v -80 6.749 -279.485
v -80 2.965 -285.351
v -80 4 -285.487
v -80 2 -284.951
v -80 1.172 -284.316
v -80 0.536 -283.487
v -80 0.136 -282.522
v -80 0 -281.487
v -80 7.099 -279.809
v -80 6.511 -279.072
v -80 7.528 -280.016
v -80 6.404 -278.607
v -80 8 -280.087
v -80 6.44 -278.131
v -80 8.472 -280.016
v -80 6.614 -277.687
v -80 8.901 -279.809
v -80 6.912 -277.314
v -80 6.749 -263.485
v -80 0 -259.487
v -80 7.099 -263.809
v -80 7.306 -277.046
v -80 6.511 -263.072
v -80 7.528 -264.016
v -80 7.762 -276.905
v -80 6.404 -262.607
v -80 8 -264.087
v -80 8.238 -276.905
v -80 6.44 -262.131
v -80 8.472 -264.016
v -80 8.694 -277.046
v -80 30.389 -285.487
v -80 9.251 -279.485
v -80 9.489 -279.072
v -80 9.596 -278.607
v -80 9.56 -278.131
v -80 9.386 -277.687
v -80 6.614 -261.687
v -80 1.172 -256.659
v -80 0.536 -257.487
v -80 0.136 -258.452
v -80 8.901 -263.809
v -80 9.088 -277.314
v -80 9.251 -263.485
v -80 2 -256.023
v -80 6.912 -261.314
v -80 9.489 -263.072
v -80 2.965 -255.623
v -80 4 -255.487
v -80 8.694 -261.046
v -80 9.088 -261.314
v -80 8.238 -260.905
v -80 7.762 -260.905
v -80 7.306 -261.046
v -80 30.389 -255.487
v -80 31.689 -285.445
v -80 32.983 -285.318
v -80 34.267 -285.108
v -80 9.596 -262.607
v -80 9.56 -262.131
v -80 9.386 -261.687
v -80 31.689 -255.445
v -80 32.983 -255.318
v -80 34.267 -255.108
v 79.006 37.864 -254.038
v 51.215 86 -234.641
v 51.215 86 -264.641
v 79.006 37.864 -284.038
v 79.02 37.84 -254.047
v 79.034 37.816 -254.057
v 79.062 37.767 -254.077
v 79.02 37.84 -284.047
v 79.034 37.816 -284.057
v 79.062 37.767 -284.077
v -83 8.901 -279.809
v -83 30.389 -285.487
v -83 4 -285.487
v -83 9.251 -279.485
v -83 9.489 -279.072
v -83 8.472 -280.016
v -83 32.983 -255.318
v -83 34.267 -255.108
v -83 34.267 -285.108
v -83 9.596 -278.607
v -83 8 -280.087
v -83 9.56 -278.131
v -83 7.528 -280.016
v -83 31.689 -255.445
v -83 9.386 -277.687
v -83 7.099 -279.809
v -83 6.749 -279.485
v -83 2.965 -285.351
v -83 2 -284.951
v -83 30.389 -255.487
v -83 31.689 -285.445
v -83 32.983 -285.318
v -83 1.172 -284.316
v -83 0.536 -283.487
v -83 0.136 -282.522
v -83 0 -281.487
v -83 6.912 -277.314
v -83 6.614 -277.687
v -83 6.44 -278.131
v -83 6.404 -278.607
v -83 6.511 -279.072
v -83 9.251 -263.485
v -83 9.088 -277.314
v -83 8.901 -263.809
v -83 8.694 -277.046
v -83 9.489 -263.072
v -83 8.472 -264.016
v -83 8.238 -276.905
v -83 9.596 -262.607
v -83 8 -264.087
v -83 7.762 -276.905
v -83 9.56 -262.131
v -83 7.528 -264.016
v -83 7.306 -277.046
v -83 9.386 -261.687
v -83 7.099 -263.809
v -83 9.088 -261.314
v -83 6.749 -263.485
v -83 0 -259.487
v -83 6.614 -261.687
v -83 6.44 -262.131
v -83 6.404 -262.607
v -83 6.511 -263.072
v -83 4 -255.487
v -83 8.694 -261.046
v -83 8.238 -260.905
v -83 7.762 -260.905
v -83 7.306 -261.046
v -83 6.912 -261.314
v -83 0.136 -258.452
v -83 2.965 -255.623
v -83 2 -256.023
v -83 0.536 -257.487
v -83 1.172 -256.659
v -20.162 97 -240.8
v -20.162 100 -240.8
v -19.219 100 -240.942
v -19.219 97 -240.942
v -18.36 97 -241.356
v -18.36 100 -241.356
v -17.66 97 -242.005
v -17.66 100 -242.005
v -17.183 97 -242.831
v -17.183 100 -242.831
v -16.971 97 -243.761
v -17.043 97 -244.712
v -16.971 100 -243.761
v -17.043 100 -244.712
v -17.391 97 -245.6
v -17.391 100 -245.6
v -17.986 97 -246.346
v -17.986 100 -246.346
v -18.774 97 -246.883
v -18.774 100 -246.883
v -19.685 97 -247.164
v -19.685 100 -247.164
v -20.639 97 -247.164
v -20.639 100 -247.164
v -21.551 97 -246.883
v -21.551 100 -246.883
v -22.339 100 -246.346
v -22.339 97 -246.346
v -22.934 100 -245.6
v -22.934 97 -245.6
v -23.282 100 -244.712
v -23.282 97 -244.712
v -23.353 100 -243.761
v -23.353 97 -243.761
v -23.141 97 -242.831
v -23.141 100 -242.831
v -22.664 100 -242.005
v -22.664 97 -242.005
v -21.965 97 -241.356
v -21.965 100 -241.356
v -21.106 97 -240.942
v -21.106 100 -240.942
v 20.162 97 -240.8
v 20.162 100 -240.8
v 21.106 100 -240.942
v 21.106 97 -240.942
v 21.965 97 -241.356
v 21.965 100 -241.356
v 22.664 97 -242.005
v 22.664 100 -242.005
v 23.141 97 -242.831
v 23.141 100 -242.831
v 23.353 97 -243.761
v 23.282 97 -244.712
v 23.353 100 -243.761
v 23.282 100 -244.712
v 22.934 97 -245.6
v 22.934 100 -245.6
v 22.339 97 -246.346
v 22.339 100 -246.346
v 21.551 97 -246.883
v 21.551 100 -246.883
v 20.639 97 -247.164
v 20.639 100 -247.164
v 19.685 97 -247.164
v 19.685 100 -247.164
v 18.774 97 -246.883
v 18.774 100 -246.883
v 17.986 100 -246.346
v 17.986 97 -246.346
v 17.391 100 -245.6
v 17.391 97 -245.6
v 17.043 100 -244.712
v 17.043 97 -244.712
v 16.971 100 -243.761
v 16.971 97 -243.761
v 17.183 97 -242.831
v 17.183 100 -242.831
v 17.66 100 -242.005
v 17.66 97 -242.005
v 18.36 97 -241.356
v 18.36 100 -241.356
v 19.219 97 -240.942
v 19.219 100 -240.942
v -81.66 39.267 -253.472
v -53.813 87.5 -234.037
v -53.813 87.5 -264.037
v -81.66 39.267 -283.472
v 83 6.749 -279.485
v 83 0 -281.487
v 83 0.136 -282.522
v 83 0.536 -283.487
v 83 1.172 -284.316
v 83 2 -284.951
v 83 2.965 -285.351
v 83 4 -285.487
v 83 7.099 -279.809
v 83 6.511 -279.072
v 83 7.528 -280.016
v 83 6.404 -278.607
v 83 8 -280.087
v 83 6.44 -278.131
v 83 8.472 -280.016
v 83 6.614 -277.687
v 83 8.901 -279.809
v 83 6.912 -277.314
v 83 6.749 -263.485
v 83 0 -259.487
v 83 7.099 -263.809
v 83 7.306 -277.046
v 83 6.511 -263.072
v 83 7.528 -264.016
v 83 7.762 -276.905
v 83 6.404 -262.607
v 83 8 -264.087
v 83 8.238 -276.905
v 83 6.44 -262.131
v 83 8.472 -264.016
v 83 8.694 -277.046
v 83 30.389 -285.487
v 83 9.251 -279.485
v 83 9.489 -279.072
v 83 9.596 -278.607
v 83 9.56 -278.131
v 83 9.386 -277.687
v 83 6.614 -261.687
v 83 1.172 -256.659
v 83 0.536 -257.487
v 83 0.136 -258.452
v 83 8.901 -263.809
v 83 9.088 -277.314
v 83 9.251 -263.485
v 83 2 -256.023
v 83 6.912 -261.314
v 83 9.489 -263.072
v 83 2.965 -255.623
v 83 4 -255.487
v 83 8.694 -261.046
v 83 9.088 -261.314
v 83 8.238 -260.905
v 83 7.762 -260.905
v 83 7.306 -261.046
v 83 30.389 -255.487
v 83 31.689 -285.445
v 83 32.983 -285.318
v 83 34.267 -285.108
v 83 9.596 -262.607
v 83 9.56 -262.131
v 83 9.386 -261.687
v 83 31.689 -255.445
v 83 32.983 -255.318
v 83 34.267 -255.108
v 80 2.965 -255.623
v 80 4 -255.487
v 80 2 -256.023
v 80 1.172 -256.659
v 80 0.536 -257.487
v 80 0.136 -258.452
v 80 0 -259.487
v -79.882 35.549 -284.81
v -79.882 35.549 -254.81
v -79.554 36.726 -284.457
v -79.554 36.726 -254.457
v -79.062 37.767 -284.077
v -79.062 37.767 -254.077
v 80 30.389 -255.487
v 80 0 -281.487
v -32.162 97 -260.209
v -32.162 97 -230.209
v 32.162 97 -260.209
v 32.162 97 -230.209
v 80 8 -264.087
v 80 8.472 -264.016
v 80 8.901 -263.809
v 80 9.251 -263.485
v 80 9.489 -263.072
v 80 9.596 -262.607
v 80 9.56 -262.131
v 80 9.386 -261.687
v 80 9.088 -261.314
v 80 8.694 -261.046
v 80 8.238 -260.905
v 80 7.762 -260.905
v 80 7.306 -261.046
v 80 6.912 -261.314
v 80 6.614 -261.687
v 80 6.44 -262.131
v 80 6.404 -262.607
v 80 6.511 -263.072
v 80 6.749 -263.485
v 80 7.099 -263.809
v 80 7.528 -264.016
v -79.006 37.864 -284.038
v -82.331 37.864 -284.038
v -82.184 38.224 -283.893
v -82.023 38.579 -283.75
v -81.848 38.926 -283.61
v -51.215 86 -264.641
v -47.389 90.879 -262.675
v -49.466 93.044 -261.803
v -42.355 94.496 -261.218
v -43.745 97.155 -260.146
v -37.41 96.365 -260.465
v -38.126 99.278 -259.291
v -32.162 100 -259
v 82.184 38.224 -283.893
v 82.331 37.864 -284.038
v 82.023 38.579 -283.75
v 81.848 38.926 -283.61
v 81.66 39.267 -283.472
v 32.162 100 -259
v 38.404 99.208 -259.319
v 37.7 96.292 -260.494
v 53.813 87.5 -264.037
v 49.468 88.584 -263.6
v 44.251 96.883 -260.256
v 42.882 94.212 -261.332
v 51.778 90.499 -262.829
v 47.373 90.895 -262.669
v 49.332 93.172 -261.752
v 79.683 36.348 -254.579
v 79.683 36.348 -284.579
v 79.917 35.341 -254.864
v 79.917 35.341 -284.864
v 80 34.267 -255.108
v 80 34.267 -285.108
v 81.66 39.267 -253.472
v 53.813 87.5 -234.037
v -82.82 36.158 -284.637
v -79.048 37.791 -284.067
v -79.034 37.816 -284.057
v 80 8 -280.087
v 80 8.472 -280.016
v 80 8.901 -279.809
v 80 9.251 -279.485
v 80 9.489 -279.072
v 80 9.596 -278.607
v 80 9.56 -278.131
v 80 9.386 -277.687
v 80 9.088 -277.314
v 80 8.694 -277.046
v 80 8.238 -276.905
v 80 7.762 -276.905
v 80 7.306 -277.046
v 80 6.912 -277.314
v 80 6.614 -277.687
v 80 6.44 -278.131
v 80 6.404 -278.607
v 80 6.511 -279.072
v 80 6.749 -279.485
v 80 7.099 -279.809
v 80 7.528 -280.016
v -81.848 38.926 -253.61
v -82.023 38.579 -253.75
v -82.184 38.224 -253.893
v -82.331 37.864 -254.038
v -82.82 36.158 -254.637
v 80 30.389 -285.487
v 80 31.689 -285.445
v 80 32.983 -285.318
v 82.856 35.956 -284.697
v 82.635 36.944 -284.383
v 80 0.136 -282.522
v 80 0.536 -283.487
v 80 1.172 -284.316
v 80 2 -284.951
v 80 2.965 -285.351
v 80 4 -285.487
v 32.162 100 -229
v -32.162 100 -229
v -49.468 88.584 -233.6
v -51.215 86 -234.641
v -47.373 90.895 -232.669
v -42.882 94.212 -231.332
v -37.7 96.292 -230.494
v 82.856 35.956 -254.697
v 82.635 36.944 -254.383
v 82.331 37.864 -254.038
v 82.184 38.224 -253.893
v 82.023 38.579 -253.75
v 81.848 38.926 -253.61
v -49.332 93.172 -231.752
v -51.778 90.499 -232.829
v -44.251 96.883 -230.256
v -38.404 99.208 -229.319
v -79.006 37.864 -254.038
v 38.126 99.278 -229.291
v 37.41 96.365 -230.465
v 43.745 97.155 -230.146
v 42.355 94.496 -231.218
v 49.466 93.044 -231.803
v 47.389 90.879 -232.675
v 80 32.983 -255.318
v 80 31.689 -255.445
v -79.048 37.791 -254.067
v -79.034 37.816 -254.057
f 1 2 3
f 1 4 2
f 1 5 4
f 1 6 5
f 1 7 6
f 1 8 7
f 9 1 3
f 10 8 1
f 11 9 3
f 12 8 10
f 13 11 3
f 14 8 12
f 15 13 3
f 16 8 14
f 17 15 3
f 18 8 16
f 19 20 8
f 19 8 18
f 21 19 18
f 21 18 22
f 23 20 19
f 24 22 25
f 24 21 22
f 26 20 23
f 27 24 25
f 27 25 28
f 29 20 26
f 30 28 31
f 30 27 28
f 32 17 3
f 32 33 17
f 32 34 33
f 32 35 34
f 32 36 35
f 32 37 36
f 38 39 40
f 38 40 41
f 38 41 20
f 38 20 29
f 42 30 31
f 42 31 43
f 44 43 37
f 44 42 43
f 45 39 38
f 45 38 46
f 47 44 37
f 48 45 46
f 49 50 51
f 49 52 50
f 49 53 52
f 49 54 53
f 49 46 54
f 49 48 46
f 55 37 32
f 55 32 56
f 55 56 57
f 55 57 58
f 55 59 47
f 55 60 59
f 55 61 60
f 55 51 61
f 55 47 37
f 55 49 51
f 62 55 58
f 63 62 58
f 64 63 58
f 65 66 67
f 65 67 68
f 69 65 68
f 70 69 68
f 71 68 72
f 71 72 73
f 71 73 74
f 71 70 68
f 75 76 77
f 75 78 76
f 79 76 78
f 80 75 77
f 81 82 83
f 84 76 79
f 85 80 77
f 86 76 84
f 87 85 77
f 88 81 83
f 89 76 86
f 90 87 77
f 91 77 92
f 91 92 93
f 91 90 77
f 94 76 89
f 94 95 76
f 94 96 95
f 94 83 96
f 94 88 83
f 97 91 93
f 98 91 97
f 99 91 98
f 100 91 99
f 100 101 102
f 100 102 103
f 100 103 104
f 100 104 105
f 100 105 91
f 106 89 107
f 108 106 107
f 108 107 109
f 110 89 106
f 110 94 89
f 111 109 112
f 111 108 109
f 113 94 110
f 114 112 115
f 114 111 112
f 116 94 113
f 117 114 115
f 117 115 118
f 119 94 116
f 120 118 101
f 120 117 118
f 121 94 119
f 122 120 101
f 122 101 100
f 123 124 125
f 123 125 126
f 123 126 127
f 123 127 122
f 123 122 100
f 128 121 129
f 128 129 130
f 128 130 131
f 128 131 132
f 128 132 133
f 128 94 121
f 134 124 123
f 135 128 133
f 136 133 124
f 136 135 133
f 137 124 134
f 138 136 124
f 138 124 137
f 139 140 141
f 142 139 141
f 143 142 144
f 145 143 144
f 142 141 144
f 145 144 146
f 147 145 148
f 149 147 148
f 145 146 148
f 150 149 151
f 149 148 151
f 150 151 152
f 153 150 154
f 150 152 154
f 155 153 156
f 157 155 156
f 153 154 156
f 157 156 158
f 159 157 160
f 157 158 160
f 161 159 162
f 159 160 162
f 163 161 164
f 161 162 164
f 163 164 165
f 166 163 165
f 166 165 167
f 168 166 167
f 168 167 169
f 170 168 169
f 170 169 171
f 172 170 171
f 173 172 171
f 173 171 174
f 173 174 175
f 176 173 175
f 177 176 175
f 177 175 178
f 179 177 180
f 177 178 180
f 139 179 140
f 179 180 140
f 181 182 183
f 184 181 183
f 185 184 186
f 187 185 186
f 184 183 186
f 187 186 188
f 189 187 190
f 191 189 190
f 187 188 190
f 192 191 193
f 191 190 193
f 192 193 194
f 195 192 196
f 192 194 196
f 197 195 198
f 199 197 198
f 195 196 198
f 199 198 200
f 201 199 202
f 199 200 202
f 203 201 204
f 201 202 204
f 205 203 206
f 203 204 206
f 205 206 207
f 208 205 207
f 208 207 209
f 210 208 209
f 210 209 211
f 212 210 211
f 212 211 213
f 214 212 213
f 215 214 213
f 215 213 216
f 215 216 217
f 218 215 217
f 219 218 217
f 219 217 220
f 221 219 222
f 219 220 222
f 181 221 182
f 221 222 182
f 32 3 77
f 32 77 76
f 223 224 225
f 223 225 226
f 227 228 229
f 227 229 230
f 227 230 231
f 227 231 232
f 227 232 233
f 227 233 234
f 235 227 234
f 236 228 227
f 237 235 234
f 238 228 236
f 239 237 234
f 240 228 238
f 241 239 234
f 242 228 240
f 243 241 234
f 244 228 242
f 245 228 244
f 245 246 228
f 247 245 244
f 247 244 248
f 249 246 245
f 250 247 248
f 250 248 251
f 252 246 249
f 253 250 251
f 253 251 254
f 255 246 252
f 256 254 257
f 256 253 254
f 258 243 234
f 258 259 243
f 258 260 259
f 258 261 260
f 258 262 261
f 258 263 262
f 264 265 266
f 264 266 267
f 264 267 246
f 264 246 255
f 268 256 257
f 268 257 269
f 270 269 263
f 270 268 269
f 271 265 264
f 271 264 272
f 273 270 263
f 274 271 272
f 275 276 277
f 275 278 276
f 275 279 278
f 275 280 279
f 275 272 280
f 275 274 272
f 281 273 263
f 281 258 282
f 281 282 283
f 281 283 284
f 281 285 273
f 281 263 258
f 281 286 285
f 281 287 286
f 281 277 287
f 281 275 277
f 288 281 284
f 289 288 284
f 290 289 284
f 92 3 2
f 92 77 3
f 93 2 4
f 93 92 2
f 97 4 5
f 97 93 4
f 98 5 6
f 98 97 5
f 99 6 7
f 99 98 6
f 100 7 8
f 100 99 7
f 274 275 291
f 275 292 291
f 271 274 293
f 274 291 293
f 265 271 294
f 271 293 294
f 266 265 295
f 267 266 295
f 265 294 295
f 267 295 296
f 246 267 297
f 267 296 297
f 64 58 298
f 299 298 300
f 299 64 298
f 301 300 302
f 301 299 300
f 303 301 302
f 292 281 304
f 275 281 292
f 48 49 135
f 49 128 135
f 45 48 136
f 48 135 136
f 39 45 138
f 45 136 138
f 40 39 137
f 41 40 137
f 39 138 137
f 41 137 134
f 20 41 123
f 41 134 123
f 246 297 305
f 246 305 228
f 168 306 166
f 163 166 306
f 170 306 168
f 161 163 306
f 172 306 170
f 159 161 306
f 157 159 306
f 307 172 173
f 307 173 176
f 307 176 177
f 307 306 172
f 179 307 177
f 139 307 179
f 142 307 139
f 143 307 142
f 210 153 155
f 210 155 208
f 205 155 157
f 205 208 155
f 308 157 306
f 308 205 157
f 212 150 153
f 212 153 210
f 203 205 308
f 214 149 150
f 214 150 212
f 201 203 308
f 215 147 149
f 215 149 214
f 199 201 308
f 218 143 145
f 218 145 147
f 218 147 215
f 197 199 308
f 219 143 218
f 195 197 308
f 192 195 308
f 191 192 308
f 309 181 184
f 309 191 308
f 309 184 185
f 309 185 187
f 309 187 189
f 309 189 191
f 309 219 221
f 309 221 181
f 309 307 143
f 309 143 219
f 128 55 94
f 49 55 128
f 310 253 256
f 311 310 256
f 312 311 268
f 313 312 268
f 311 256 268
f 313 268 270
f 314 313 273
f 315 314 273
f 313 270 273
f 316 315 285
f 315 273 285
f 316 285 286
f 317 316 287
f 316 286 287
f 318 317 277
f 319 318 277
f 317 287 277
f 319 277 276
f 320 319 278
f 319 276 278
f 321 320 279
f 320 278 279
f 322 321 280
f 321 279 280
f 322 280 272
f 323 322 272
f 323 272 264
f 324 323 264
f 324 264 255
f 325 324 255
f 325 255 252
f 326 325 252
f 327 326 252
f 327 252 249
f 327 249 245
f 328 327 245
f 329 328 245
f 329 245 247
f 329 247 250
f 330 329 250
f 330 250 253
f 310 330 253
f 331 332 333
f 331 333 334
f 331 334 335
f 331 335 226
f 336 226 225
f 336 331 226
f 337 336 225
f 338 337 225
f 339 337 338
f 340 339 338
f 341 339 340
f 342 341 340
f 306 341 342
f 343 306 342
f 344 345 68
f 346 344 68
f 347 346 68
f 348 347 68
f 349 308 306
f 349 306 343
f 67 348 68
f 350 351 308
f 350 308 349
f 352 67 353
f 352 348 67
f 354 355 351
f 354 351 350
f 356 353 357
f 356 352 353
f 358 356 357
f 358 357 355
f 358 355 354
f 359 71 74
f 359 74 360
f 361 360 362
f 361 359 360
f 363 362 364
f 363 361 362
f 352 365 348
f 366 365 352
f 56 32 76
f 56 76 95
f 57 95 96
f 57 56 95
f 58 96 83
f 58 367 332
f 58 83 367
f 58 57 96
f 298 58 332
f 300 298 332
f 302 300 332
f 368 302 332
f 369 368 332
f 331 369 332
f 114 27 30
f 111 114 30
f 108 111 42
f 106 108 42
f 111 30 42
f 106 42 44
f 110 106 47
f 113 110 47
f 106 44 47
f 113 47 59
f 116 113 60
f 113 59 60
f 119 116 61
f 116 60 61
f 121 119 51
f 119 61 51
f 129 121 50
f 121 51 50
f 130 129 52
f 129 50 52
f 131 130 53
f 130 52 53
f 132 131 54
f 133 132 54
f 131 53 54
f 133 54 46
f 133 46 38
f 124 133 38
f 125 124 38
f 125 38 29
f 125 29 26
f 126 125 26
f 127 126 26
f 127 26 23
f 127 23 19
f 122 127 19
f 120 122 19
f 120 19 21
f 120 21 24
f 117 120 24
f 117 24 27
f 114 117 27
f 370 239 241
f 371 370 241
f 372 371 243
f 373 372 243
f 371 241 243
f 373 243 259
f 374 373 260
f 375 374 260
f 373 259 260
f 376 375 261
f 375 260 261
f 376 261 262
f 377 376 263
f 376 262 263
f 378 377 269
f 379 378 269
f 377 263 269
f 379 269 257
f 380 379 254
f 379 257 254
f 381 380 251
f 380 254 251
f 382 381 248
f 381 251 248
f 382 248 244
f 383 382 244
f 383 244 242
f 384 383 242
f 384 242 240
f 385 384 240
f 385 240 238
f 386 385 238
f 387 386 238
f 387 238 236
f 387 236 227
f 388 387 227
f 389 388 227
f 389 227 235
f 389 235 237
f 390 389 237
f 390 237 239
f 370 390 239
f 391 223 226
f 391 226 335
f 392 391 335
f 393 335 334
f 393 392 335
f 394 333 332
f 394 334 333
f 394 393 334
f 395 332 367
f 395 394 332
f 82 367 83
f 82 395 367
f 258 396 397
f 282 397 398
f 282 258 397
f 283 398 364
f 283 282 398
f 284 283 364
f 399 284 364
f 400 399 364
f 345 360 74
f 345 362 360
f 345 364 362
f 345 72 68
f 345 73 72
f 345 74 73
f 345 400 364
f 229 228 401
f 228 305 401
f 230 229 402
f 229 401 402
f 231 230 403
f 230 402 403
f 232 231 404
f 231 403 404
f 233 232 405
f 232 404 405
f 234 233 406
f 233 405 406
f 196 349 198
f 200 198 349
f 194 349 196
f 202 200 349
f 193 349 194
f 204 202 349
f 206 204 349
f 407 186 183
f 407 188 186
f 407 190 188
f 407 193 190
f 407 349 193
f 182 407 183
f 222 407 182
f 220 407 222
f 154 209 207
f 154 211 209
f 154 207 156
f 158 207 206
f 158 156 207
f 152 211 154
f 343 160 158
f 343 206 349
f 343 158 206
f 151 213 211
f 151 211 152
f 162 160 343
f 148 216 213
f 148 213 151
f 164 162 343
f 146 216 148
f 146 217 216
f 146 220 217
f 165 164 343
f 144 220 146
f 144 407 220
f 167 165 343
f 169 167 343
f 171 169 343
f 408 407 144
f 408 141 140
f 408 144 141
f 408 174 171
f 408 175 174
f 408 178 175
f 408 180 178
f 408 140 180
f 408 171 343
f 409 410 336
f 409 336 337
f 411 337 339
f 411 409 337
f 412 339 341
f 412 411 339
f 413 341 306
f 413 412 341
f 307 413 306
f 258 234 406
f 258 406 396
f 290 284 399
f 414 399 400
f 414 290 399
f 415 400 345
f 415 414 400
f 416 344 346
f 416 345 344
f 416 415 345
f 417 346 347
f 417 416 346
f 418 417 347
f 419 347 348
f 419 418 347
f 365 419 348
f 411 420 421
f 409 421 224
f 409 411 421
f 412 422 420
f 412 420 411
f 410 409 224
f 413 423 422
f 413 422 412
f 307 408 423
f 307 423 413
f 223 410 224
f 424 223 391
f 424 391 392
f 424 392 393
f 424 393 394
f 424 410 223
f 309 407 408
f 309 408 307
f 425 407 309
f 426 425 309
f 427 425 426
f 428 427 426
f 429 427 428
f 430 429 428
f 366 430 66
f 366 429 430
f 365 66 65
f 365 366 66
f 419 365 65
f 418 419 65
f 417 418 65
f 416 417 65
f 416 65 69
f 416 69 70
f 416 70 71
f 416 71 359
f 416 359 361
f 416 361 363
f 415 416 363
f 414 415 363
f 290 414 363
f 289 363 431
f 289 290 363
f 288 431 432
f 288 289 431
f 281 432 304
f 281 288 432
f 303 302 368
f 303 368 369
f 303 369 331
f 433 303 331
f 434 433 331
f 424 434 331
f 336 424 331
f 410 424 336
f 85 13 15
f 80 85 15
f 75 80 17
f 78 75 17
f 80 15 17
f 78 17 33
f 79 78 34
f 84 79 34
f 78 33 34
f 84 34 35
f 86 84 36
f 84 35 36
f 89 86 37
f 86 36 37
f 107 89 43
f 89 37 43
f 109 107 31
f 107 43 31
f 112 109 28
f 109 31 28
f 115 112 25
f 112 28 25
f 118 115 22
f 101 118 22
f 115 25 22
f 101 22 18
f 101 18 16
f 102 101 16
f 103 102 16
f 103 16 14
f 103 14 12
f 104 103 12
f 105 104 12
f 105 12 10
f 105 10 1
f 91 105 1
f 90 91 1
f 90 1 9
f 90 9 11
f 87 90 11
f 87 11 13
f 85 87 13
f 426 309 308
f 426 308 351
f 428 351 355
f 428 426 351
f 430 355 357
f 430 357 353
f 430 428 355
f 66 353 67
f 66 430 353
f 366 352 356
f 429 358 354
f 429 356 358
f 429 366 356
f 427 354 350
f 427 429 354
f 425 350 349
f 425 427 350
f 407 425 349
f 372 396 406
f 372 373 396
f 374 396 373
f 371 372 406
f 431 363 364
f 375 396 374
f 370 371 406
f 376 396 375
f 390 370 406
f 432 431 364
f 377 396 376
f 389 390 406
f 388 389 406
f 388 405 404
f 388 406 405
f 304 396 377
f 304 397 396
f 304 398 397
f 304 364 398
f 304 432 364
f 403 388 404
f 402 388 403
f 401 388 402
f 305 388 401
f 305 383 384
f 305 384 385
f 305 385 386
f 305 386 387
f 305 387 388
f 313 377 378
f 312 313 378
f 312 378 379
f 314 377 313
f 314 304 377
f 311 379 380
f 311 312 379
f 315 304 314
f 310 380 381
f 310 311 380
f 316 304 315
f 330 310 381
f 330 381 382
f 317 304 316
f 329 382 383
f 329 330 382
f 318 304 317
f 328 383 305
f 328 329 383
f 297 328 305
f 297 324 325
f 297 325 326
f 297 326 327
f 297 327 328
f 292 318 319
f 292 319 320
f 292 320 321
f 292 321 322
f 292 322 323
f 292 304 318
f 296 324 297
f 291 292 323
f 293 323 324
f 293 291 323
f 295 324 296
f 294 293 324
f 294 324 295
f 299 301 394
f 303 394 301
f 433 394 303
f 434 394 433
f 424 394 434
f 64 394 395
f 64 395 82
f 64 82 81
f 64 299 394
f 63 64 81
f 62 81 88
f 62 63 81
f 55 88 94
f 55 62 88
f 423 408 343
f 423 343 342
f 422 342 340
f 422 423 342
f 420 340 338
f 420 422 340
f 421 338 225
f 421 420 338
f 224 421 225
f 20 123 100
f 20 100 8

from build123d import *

# Parameters (mm, degrees)
BOSS_EXTRUDE4_DEPTH      = 40
BOSS_EXTRUDE4_DEPTH_BACK = 20
SKETCH5_OUTSIDE_W        = 102.574
SKETCH5_OUTSIDE_H        = 142.574
CUT_EXTRUDE1_DEPTH       = 348.961204734
SKETCH6_R                = 1.6
CUT_EXTRUDE2_DEPTH       = 346.049136601
FILLET1_R                = 4
SKETCH7_R                = 3.2
CUT_EXTRUDE3_DEPTH       = 3


with BuildPart() as part:
    # Sketch4 → Boss-Extrude4 (new, two sides: drawn at the far end of the back side and taken through both)
    with BuildSketch(Plane(origin=(0, 0, -249), x_dir=(-1, 0, 0), z_dir=(0, 0, -1)).offset(-BOSS_EXTRUDE4_DEPTH_BACK)):
        with BuildLine():
            Line((-83, 0), (-83, 34.267002189))
            ThreePointArc((-83, 34.267002189), (-82.659258263, 36.85519264), (-81.660254038, 39.267002189))
            Line((-81.660254038, 39.267002189), (-53.812919768, 87.5))
            ThreePointArc((-53.812919768, 87.5), (-44.662284673, 96.650635095), (-32.162284673, 100))
            Line((-32.162284673, 100), (0, 100))
            Line((0, 100), (32.162284673, 100))
            ThreePointArc((32.162284673, 100), (44.662284673, 96.650635095), (53.812919768, 87.5))
            Line((53.812919768, 87.5), (81.660254038, 39.267002189))
            ThreePointArc((81.660254038, 39.267002189), (82.659258263, 36.85519264), (83, 34.267002189))
            Line((83, 34.267002189), (83, 0))
            Line((83, 0), (80, 0))
            Line((80, 0), (80, 34.267002189))
            ThreePointArc((80, 34.267002189), (79.761480784, 36.078735505), (79.062177826, 37.767002189))
            Line((79.062177826, 37.767002189), (51.214843556, 86))
            ThreePointArc((51.214843556, 86), (43.162284673, 94.052558883), (32.162284673, 97))
            Line((32.162284673, 97), (0, 97))
            Line((0, 97), (-32.162284673, 97))
            ThreePointArc((-32.162284673, 97), (-43.162284673, 94.052558883), (-51.214843556, 86))
            Line((-51.214843556, 86), (-79.062177826, 37.767002189))
            ThreePointArc((-79.062177826, 37.767002189), (-79.761480784, 36.078735505), (-80, 34.267002189))
            Line((-80, 34.267002189), (-80, 0))
            Line((-80, 0), (-83, 0))
        make_face()
    extrude(amount=BOSS_EXTRUDE4_DEPTH + BOSS_EXTRUDE4_DEPTH_BACK)

    # Sketch5 outside → Cut-Extrude1 (cut, through all)
    with BuildSketch(Plane(origin=(83, 0, 0), x_dir=(0, 0, -1), z_dir=(1, 0, 0))):
        with Locations((259, 50)):
            Rectangle(SKETCH5_OUTSIDE_W, SKETCH5_OUTSIDE_H)
        with BuildLine():
            Line((229, 100), (254.037739827, 37.863968909))
            ThreePointArc((254.037739827, 37.863968909), (255.121445979, 34.196094194), (255.487139078, 30.388996545))
            Line((255.487139078, 30.388996545), (255.487139078, 0))
            Line((255.487139078, 0), (285.487139078, 0))
            Line((285.487139078, 0), (285.487139078, 30.388996545))
            ThreePointArc((285.487139078, 30.388996545), (285.121445979, 34.196094194), (284.037739827, 37.863968909))
            Line((284.037739827, 37.863968909), (259, 100))
            Line((259, 100), (229, 100))
        make_face(mode=Mode.SUBTRACT)
    extrude(amount=-CUT_EXTRUDE1_DEPTH, mode=Mode.SUBTRACT)

    # Sketch6 → Cut-Extrude2 (cut, through all)
    with BuildSketch(Plane(origin=(83, 0, 0), x_dir=(0, 0, -1), z_dir=(1, 0, 0))):
        with Locations((262.487139078, 8)):
            Circle(SKETCH6_R)
        with Locations((278.487139078, 8)):
            Circle(SKETCH6_R)
    extrude(amount=-CUT_EXTRUDE2_DEPTH, mode=Mode.SUBTRACT)

    # Fillet1
    fillet1_edges = [part.edges().sort_by_distance(p)[0] for p in [
        (81.5, 0, -285.487139078),
        (-81.5, 0, -285.487139078),
        (81.5, 0, -255.487139078),
        (-81.5, 0, -255.487139078),
    ]]
    fillet(fillet1_edges, radius=FILLET1_R)

    # Sketch7 → Cut-Extrude3 (cut)
    with BuildSketch(Plane(origin=(0, 100, 0), x_dir=(1, 0, 0), z_dir=(0, 1, 0))):
        with Locations(Location((-20.162284673, 244, 0), (0, 0, 270))):
            Circle(SKETCH7_R)
        with Locations(Location((20.162284673, 244, 0), (0, 0, 270))):
            Circle(SKETCH7_R)
    extrude(amount=-CUT_EXTRUDE3_DEPTH, mode=Mode.SUBTRACT)


solid = part.part
